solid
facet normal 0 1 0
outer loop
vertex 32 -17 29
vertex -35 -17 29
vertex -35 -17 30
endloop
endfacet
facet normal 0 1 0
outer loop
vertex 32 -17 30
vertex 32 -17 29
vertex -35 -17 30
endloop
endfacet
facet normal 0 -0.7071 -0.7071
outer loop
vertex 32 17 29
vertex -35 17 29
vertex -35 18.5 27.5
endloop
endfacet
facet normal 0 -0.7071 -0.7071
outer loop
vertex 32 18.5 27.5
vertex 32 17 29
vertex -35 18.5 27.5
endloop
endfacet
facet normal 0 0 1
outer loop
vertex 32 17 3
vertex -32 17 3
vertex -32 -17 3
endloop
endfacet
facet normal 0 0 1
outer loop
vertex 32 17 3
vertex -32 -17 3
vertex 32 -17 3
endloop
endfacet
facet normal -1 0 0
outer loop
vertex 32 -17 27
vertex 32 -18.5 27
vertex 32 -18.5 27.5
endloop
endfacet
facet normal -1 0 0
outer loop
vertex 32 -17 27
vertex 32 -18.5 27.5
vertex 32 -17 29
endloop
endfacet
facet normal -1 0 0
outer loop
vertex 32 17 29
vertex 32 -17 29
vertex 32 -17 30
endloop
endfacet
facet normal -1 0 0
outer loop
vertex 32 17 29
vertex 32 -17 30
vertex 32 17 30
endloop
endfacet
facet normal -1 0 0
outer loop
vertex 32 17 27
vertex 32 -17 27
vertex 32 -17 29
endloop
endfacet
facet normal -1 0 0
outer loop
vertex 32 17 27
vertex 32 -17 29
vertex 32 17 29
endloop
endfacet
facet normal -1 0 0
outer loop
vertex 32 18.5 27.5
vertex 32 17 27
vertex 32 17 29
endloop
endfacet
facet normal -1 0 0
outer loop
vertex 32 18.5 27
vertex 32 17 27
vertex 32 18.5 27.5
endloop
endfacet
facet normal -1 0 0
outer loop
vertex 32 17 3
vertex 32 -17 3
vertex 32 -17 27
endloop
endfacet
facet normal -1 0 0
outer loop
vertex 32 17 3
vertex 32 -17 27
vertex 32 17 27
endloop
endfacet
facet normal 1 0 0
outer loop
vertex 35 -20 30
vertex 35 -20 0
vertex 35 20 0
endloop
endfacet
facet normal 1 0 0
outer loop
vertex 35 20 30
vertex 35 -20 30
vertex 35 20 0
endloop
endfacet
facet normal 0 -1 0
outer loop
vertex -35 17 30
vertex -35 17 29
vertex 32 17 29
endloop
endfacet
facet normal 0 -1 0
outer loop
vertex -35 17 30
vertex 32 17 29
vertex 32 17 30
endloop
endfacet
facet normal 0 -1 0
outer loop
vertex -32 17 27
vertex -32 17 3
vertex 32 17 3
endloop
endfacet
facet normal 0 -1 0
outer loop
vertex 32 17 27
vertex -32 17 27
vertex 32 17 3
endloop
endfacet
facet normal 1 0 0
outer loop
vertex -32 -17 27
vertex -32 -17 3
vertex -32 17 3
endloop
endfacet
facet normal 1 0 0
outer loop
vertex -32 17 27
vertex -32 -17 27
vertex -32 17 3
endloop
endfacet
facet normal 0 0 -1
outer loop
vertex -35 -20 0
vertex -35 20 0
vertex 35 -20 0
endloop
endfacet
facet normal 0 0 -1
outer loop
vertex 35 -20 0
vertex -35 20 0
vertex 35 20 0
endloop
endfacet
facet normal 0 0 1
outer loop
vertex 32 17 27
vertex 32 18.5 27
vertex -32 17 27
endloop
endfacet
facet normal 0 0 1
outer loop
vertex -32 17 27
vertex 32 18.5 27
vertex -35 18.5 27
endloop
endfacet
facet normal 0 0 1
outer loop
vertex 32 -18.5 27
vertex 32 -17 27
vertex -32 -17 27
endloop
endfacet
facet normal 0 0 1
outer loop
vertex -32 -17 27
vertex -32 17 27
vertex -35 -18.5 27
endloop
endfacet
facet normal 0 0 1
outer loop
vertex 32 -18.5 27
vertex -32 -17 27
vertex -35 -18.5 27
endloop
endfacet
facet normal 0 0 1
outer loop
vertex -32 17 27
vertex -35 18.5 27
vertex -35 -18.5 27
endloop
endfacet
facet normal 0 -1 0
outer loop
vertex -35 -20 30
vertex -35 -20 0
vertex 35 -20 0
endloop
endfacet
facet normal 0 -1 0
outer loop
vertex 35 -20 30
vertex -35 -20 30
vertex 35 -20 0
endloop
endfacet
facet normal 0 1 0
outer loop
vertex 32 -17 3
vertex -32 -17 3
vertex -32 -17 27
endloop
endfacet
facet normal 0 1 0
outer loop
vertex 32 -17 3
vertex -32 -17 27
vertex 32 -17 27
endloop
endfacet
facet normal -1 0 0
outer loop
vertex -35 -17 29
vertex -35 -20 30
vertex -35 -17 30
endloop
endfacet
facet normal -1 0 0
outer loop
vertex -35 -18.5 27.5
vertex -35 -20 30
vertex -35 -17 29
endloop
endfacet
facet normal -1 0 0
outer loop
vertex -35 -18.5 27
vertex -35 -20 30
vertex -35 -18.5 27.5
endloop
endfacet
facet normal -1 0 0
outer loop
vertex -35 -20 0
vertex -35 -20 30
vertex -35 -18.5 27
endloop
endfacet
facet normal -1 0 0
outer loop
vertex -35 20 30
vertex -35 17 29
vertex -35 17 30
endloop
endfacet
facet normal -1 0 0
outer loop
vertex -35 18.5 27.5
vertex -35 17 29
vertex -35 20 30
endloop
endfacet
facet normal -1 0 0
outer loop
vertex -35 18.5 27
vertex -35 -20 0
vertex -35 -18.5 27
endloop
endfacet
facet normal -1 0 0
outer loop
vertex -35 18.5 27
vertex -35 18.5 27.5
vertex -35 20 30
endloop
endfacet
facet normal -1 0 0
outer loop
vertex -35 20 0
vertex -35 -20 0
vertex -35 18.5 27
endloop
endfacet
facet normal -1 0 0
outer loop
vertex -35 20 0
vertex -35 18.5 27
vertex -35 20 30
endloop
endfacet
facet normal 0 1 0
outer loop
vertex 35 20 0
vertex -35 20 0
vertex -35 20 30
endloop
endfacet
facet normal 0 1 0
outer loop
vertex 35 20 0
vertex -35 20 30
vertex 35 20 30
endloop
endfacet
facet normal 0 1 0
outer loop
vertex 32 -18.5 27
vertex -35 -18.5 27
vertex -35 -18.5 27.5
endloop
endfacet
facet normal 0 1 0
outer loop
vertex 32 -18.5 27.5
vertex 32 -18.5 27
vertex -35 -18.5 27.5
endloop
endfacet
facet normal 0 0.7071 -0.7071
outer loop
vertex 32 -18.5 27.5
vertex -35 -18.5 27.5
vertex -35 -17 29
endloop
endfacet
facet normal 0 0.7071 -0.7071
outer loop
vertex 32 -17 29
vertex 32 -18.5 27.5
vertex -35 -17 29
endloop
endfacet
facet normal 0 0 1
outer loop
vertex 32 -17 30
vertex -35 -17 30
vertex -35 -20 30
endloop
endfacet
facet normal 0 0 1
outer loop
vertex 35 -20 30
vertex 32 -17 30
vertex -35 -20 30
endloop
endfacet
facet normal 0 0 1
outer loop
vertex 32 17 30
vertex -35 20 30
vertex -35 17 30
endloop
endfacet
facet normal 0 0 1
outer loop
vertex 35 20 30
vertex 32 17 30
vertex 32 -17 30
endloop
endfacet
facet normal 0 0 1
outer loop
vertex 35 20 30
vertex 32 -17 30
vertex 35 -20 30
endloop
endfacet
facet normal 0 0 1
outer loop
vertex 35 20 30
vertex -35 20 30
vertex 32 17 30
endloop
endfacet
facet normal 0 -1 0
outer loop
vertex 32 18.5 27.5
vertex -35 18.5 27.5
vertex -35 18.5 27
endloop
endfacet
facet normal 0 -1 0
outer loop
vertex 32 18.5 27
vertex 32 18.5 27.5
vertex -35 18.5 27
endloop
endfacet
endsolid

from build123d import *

# Parameters (mm, degrees)
F0_W     = 70
F0_H     = 40
F1_DEPTH = 30
F2_T     = -3
F3_W     = 34
F3_H     = 1
F4_DEPTH = 67


with BuildPart() as f1:
    # F0 (on Top) → F1 (new body)
    with BuildSketch(Plane.XY):
        Rectangle(F0_W, F0_H)
    extrude(amount=F1_DEPTH)

    # F2
    f2_openings = [f1.faces().sort_by_distance(p)[0] for p in [
        (0, 0, 30),
    ]]
    offset(amount=F2_T, openings=f2_openings)

    # F3 (on face) → F4 (cut, through all)
    with BuildSketch(Plane(origin=(-35, 0, 0), x_dir=(0, -1, 0), z_dir=(-1, 0, 0))):
        Polygon((-18.5, 27.5), (-18.5, 27), (18.5, 27), (18.5, 27.5), (17, 29), (-17, 29), align=None)
        with Locations((0, 29.5)):
            Rectangle(F3_W, F3_H)
    extrude(amount=-F4_DEPTH, mode=Mode.SUBTRACT)


solid = f1.part
